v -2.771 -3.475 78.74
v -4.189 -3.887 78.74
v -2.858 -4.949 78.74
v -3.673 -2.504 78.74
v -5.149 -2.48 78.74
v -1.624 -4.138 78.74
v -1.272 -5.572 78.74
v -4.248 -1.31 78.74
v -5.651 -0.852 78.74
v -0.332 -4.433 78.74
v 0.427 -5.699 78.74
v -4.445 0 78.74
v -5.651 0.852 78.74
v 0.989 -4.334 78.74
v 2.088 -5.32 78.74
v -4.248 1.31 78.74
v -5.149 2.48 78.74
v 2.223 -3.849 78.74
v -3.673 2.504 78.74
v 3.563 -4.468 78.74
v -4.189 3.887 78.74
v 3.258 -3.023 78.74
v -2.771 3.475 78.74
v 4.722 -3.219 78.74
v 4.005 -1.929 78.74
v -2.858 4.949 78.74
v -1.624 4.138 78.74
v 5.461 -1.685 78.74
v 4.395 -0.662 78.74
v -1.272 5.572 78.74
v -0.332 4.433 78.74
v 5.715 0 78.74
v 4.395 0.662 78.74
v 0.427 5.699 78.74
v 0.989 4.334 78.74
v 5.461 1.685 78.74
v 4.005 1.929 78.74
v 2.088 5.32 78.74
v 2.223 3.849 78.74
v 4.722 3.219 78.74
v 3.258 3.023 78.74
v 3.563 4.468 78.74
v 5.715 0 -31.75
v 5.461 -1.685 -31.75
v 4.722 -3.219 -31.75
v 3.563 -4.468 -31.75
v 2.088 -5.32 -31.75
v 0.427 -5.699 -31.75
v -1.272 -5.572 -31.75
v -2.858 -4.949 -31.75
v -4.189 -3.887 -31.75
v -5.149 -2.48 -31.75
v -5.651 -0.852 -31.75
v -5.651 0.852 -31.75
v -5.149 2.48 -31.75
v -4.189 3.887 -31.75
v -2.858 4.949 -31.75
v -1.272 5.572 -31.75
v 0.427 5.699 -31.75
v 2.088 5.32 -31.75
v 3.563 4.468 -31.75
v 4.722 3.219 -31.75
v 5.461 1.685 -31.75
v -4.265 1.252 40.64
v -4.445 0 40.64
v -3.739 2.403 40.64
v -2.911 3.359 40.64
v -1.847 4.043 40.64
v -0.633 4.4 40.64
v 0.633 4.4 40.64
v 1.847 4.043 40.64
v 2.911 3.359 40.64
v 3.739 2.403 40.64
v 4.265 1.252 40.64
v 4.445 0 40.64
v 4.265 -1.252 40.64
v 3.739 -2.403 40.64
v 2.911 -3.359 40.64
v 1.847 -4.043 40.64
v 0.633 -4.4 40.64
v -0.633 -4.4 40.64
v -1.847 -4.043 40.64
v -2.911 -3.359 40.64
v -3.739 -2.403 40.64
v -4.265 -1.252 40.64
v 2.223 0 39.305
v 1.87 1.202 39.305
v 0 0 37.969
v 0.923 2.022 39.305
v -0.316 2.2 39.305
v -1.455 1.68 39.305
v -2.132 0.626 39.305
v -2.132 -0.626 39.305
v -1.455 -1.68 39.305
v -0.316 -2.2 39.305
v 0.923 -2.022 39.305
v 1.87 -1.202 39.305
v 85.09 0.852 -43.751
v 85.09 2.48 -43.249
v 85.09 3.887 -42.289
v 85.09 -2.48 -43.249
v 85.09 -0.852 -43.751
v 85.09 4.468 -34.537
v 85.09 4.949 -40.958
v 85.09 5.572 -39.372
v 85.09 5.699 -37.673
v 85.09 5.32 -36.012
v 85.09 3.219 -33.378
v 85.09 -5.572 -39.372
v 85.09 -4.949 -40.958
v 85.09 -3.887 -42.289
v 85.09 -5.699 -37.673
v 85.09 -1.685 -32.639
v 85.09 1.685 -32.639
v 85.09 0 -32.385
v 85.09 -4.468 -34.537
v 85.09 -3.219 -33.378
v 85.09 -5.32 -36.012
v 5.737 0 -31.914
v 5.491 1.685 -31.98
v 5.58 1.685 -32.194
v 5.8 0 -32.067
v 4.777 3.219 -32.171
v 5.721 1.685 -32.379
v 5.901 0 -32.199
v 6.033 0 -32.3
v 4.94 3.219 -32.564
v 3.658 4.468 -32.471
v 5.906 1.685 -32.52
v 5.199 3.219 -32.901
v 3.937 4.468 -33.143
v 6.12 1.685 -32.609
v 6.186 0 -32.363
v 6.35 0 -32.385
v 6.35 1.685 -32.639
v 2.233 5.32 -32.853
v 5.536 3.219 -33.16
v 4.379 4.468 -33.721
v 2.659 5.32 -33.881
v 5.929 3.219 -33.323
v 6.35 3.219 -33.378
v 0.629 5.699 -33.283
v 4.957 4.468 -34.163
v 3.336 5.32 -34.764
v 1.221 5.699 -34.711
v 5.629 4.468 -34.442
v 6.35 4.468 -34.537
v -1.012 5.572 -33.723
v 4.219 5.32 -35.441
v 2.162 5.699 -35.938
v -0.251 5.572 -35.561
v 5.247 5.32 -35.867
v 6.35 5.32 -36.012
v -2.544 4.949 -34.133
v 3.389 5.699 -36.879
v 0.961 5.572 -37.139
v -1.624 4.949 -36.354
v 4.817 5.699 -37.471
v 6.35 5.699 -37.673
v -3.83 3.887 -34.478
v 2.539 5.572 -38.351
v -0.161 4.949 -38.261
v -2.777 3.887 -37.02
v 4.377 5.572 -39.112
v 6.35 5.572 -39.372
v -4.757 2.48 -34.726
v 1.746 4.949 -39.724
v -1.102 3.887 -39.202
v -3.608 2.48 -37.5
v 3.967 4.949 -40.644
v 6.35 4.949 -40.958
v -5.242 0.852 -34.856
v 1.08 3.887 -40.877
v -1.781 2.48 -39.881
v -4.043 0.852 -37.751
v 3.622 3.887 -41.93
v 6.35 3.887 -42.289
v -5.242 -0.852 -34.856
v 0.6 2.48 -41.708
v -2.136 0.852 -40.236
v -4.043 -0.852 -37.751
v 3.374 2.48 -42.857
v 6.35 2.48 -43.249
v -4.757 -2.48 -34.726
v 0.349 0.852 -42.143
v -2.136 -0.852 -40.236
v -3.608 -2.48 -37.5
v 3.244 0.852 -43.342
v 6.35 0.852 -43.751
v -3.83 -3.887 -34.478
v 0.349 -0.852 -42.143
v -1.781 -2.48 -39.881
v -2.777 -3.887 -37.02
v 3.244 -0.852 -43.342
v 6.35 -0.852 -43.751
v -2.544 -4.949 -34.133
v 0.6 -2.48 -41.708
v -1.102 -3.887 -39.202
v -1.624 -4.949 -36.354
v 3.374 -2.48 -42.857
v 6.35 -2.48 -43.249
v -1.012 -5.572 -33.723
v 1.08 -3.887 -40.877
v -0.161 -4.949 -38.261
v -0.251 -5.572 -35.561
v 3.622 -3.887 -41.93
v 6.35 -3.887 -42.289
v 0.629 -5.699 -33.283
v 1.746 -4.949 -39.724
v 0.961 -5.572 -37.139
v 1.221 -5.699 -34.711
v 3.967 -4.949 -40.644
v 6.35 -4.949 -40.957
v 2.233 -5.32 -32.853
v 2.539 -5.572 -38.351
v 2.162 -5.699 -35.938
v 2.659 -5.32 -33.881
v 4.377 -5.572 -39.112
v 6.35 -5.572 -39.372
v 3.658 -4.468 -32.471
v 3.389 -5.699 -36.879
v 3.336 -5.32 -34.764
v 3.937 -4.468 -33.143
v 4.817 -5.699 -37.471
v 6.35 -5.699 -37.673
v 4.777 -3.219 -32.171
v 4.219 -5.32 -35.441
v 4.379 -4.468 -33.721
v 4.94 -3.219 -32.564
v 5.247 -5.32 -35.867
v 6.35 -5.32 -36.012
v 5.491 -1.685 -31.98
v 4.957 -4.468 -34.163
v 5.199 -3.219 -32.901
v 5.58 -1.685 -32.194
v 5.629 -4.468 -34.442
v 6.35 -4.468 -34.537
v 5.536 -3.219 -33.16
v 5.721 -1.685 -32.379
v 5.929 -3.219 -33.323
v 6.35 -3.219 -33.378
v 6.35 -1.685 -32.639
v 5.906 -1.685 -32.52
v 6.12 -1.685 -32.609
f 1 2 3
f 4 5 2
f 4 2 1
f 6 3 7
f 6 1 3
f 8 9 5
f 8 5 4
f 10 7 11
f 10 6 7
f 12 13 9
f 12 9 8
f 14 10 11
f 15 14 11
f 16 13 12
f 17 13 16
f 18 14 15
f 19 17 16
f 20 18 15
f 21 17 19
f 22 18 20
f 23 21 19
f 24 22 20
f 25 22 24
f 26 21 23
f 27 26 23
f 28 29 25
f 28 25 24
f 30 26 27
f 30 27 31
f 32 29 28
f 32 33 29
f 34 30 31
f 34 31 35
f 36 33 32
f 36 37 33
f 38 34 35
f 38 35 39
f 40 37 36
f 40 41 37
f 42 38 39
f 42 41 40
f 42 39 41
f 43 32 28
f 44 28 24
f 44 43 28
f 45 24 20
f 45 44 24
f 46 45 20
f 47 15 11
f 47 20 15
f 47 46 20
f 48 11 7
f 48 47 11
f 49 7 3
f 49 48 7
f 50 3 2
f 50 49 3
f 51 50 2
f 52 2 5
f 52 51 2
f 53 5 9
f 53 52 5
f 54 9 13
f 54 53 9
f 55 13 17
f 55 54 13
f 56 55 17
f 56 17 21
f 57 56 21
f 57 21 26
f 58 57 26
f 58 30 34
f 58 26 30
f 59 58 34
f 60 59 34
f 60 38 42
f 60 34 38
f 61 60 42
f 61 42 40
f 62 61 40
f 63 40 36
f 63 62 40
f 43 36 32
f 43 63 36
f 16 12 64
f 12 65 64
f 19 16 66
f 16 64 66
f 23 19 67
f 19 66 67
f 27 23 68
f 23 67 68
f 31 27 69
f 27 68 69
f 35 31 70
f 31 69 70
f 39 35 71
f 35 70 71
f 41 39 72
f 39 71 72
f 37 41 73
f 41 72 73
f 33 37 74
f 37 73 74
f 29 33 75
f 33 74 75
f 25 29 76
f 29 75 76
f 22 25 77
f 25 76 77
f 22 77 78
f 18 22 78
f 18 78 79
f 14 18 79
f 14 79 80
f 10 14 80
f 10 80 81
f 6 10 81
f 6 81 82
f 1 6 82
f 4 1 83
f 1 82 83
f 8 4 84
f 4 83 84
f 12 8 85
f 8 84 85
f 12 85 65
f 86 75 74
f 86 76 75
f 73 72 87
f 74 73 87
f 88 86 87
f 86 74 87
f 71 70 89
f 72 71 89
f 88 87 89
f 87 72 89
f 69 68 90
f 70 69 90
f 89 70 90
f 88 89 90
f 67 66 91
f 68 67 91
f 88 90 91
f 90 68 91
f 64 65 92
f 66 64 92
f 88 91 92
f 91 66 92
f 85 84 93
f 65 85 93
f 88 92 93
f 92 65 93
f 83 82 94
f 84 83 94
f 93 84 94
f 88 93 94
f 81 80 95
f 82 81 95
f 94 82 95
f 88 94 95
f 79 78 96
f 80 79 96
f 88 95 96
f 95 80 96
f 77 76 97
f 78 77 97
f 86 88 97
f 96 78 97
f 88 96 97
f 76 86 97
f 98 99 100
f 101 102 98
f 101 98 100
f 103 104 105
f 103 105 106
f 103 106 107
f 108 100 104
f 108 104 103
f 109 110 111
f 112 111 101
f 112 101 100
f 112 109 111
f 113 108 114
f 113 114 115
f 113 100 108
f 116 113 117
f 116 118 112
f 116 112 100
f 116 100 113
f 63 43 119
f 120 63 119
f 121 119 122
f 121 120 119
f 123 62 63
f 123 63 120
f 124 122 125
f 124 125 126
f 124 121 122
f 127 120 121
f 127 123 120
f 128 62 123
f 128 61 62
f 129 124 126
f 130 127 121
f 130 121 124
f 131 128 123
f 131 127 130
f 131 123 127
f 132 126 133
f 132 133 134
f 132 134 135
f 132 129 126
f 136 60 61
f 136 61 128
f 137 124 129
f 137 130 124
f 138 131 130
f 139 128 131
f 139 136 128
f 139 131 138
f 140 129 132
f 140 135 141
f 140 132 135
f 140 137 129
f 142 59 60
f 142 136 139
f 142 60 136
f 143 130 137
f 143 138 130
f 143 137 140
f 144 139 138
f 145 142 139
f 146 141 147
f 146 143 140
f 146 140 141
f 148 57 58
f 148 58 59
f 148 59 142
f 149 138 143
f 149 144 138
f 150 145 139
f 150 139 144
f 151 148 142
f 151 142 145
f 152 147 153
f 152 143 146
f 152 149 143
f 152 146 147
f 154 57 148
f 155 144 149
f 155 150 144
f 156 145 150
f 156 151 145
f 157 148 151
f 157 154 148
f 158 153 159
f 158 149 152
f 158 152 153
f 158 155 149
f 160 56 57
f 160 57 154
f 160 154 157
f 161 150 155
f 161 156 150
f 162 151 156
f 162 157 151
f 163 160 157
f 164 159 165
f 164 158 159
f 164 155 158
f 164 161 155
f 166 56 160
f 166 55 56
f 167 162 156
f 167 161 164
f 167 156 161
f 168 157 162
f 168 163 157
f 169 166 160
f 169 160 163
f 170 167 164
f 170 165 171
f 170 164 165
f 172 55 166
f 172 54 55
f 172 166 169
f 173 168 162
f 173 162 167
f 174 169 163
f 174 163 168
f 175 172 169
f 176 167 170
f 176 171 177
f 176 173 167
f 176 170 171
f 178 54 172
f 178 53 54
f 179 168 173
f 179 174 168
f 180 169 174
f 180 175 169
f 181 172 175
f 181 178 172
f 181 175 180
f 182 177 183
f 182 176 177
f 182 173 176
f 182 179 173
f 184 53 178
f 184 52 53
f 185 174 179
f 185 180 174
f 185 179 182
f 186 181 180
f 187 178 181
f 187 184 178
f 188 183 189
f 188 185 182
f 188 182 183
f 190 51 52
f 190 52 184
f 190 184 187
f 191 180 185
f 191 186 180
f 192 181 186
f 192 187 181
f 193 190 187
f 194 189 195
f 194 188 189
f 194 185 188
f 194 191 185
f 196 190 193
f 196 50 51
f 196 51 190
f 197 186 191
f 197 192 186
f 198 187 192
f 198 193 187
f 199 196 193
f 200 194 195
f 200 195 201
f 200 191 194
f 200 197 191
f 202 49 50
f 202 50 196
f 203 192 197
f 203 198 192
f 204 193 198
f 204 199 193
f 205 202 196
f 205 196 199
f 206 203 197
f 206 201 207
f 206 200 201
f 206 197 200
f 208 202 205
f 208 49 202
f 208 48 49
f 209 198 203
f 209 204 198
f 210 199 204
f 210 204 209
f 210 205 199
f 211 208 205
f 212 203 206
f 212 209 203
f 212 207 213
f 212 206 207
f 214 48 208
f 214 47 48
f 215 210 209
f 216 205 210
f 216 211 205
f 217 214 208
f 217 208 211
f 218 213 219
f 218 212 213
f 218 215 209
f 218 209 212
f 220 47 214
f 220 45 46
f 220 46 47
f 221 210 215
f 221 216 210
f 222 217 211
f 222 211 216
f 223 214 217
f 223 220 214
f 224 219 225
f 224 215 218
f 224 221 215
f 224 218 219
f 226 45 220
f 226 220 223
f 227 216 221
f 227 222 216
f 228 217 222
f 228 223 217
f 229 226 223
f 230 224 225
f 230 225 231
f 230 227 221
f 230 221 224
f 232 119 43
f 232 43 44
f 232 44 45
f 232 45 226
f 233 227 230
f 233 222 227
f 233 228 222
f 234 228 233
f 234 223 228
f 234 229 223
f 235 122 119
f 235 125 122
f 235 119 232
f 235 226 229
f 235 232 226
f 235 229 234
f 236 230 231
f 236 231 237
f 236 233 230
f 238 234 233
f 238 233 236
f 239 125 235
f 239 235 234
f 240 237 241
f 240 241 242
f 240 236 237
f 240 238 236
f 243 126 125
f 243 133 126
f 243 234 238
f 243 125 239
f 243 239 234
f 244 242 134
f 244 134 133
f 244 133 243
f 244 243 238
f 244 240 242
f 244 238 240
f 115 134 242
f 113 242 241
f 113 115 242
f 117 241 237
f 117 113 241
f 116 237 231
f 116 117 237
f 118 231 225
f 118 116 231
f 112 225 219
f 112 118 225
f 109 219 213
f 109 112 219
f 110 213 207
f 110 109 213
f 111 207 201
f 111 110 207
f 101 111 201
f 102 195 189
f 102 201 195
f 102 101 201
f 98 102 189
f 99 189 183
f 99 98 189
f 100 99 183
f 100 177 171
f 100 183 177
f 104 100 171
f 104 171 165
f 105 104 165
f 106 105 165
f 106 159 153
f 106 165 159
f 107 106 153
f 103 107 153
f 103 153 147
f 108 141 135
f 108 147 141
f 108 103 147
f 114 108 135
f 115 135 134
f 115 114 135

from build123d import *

# Parameters (mm, degrees)
F0_R     = 5.715
F1_DEPTH = 78.74
F3_D     = 8.89
F3_DEPTH = 38.1
F3_TIP   = 2.6708254516
F4_R     = 5.715


with BuildPart() as f1:
    # F0 (on Top) → F1 (new body)
    with BuildSketch(Plane.XY):
        Circle(F0_R)
    extrude(amount=F1_DEPTH)

    # F3
    with Locations(Plane.XY.offset(78.74)):
        with Locations((0, 0)):
            Hole(F3_D / 2, depth=F3_DEPTH)
            with Locations((0, 0, -(F3_DEPTH + F3_TIP / 2))):  # 118° drill point
                Cone(0, F3_D / 2, F3_TIP, mode=Mode.SUBTRACT)

    # F6: sweep along a path in F5
    with BuildLine(Plane.XZ) as f6_path:
        Line((0, 0), (0, -31.75))
        ThreePointArc((0, -31.75), (1.8598719395, -36.2401280605), (6.35, -38.1))
        Line((6.35, -38.1), (85.09, -38.1))
    # F4 (on face) → F6 (sweep)
    with BuildSketch(Plane(origin=(0, 0, 0), x_dir=(1, 0, 0), z_dir=(0, 0, -1))):
        Circle(F4_R)
    sweep(path=f6_path.line)


solid = f1.part
